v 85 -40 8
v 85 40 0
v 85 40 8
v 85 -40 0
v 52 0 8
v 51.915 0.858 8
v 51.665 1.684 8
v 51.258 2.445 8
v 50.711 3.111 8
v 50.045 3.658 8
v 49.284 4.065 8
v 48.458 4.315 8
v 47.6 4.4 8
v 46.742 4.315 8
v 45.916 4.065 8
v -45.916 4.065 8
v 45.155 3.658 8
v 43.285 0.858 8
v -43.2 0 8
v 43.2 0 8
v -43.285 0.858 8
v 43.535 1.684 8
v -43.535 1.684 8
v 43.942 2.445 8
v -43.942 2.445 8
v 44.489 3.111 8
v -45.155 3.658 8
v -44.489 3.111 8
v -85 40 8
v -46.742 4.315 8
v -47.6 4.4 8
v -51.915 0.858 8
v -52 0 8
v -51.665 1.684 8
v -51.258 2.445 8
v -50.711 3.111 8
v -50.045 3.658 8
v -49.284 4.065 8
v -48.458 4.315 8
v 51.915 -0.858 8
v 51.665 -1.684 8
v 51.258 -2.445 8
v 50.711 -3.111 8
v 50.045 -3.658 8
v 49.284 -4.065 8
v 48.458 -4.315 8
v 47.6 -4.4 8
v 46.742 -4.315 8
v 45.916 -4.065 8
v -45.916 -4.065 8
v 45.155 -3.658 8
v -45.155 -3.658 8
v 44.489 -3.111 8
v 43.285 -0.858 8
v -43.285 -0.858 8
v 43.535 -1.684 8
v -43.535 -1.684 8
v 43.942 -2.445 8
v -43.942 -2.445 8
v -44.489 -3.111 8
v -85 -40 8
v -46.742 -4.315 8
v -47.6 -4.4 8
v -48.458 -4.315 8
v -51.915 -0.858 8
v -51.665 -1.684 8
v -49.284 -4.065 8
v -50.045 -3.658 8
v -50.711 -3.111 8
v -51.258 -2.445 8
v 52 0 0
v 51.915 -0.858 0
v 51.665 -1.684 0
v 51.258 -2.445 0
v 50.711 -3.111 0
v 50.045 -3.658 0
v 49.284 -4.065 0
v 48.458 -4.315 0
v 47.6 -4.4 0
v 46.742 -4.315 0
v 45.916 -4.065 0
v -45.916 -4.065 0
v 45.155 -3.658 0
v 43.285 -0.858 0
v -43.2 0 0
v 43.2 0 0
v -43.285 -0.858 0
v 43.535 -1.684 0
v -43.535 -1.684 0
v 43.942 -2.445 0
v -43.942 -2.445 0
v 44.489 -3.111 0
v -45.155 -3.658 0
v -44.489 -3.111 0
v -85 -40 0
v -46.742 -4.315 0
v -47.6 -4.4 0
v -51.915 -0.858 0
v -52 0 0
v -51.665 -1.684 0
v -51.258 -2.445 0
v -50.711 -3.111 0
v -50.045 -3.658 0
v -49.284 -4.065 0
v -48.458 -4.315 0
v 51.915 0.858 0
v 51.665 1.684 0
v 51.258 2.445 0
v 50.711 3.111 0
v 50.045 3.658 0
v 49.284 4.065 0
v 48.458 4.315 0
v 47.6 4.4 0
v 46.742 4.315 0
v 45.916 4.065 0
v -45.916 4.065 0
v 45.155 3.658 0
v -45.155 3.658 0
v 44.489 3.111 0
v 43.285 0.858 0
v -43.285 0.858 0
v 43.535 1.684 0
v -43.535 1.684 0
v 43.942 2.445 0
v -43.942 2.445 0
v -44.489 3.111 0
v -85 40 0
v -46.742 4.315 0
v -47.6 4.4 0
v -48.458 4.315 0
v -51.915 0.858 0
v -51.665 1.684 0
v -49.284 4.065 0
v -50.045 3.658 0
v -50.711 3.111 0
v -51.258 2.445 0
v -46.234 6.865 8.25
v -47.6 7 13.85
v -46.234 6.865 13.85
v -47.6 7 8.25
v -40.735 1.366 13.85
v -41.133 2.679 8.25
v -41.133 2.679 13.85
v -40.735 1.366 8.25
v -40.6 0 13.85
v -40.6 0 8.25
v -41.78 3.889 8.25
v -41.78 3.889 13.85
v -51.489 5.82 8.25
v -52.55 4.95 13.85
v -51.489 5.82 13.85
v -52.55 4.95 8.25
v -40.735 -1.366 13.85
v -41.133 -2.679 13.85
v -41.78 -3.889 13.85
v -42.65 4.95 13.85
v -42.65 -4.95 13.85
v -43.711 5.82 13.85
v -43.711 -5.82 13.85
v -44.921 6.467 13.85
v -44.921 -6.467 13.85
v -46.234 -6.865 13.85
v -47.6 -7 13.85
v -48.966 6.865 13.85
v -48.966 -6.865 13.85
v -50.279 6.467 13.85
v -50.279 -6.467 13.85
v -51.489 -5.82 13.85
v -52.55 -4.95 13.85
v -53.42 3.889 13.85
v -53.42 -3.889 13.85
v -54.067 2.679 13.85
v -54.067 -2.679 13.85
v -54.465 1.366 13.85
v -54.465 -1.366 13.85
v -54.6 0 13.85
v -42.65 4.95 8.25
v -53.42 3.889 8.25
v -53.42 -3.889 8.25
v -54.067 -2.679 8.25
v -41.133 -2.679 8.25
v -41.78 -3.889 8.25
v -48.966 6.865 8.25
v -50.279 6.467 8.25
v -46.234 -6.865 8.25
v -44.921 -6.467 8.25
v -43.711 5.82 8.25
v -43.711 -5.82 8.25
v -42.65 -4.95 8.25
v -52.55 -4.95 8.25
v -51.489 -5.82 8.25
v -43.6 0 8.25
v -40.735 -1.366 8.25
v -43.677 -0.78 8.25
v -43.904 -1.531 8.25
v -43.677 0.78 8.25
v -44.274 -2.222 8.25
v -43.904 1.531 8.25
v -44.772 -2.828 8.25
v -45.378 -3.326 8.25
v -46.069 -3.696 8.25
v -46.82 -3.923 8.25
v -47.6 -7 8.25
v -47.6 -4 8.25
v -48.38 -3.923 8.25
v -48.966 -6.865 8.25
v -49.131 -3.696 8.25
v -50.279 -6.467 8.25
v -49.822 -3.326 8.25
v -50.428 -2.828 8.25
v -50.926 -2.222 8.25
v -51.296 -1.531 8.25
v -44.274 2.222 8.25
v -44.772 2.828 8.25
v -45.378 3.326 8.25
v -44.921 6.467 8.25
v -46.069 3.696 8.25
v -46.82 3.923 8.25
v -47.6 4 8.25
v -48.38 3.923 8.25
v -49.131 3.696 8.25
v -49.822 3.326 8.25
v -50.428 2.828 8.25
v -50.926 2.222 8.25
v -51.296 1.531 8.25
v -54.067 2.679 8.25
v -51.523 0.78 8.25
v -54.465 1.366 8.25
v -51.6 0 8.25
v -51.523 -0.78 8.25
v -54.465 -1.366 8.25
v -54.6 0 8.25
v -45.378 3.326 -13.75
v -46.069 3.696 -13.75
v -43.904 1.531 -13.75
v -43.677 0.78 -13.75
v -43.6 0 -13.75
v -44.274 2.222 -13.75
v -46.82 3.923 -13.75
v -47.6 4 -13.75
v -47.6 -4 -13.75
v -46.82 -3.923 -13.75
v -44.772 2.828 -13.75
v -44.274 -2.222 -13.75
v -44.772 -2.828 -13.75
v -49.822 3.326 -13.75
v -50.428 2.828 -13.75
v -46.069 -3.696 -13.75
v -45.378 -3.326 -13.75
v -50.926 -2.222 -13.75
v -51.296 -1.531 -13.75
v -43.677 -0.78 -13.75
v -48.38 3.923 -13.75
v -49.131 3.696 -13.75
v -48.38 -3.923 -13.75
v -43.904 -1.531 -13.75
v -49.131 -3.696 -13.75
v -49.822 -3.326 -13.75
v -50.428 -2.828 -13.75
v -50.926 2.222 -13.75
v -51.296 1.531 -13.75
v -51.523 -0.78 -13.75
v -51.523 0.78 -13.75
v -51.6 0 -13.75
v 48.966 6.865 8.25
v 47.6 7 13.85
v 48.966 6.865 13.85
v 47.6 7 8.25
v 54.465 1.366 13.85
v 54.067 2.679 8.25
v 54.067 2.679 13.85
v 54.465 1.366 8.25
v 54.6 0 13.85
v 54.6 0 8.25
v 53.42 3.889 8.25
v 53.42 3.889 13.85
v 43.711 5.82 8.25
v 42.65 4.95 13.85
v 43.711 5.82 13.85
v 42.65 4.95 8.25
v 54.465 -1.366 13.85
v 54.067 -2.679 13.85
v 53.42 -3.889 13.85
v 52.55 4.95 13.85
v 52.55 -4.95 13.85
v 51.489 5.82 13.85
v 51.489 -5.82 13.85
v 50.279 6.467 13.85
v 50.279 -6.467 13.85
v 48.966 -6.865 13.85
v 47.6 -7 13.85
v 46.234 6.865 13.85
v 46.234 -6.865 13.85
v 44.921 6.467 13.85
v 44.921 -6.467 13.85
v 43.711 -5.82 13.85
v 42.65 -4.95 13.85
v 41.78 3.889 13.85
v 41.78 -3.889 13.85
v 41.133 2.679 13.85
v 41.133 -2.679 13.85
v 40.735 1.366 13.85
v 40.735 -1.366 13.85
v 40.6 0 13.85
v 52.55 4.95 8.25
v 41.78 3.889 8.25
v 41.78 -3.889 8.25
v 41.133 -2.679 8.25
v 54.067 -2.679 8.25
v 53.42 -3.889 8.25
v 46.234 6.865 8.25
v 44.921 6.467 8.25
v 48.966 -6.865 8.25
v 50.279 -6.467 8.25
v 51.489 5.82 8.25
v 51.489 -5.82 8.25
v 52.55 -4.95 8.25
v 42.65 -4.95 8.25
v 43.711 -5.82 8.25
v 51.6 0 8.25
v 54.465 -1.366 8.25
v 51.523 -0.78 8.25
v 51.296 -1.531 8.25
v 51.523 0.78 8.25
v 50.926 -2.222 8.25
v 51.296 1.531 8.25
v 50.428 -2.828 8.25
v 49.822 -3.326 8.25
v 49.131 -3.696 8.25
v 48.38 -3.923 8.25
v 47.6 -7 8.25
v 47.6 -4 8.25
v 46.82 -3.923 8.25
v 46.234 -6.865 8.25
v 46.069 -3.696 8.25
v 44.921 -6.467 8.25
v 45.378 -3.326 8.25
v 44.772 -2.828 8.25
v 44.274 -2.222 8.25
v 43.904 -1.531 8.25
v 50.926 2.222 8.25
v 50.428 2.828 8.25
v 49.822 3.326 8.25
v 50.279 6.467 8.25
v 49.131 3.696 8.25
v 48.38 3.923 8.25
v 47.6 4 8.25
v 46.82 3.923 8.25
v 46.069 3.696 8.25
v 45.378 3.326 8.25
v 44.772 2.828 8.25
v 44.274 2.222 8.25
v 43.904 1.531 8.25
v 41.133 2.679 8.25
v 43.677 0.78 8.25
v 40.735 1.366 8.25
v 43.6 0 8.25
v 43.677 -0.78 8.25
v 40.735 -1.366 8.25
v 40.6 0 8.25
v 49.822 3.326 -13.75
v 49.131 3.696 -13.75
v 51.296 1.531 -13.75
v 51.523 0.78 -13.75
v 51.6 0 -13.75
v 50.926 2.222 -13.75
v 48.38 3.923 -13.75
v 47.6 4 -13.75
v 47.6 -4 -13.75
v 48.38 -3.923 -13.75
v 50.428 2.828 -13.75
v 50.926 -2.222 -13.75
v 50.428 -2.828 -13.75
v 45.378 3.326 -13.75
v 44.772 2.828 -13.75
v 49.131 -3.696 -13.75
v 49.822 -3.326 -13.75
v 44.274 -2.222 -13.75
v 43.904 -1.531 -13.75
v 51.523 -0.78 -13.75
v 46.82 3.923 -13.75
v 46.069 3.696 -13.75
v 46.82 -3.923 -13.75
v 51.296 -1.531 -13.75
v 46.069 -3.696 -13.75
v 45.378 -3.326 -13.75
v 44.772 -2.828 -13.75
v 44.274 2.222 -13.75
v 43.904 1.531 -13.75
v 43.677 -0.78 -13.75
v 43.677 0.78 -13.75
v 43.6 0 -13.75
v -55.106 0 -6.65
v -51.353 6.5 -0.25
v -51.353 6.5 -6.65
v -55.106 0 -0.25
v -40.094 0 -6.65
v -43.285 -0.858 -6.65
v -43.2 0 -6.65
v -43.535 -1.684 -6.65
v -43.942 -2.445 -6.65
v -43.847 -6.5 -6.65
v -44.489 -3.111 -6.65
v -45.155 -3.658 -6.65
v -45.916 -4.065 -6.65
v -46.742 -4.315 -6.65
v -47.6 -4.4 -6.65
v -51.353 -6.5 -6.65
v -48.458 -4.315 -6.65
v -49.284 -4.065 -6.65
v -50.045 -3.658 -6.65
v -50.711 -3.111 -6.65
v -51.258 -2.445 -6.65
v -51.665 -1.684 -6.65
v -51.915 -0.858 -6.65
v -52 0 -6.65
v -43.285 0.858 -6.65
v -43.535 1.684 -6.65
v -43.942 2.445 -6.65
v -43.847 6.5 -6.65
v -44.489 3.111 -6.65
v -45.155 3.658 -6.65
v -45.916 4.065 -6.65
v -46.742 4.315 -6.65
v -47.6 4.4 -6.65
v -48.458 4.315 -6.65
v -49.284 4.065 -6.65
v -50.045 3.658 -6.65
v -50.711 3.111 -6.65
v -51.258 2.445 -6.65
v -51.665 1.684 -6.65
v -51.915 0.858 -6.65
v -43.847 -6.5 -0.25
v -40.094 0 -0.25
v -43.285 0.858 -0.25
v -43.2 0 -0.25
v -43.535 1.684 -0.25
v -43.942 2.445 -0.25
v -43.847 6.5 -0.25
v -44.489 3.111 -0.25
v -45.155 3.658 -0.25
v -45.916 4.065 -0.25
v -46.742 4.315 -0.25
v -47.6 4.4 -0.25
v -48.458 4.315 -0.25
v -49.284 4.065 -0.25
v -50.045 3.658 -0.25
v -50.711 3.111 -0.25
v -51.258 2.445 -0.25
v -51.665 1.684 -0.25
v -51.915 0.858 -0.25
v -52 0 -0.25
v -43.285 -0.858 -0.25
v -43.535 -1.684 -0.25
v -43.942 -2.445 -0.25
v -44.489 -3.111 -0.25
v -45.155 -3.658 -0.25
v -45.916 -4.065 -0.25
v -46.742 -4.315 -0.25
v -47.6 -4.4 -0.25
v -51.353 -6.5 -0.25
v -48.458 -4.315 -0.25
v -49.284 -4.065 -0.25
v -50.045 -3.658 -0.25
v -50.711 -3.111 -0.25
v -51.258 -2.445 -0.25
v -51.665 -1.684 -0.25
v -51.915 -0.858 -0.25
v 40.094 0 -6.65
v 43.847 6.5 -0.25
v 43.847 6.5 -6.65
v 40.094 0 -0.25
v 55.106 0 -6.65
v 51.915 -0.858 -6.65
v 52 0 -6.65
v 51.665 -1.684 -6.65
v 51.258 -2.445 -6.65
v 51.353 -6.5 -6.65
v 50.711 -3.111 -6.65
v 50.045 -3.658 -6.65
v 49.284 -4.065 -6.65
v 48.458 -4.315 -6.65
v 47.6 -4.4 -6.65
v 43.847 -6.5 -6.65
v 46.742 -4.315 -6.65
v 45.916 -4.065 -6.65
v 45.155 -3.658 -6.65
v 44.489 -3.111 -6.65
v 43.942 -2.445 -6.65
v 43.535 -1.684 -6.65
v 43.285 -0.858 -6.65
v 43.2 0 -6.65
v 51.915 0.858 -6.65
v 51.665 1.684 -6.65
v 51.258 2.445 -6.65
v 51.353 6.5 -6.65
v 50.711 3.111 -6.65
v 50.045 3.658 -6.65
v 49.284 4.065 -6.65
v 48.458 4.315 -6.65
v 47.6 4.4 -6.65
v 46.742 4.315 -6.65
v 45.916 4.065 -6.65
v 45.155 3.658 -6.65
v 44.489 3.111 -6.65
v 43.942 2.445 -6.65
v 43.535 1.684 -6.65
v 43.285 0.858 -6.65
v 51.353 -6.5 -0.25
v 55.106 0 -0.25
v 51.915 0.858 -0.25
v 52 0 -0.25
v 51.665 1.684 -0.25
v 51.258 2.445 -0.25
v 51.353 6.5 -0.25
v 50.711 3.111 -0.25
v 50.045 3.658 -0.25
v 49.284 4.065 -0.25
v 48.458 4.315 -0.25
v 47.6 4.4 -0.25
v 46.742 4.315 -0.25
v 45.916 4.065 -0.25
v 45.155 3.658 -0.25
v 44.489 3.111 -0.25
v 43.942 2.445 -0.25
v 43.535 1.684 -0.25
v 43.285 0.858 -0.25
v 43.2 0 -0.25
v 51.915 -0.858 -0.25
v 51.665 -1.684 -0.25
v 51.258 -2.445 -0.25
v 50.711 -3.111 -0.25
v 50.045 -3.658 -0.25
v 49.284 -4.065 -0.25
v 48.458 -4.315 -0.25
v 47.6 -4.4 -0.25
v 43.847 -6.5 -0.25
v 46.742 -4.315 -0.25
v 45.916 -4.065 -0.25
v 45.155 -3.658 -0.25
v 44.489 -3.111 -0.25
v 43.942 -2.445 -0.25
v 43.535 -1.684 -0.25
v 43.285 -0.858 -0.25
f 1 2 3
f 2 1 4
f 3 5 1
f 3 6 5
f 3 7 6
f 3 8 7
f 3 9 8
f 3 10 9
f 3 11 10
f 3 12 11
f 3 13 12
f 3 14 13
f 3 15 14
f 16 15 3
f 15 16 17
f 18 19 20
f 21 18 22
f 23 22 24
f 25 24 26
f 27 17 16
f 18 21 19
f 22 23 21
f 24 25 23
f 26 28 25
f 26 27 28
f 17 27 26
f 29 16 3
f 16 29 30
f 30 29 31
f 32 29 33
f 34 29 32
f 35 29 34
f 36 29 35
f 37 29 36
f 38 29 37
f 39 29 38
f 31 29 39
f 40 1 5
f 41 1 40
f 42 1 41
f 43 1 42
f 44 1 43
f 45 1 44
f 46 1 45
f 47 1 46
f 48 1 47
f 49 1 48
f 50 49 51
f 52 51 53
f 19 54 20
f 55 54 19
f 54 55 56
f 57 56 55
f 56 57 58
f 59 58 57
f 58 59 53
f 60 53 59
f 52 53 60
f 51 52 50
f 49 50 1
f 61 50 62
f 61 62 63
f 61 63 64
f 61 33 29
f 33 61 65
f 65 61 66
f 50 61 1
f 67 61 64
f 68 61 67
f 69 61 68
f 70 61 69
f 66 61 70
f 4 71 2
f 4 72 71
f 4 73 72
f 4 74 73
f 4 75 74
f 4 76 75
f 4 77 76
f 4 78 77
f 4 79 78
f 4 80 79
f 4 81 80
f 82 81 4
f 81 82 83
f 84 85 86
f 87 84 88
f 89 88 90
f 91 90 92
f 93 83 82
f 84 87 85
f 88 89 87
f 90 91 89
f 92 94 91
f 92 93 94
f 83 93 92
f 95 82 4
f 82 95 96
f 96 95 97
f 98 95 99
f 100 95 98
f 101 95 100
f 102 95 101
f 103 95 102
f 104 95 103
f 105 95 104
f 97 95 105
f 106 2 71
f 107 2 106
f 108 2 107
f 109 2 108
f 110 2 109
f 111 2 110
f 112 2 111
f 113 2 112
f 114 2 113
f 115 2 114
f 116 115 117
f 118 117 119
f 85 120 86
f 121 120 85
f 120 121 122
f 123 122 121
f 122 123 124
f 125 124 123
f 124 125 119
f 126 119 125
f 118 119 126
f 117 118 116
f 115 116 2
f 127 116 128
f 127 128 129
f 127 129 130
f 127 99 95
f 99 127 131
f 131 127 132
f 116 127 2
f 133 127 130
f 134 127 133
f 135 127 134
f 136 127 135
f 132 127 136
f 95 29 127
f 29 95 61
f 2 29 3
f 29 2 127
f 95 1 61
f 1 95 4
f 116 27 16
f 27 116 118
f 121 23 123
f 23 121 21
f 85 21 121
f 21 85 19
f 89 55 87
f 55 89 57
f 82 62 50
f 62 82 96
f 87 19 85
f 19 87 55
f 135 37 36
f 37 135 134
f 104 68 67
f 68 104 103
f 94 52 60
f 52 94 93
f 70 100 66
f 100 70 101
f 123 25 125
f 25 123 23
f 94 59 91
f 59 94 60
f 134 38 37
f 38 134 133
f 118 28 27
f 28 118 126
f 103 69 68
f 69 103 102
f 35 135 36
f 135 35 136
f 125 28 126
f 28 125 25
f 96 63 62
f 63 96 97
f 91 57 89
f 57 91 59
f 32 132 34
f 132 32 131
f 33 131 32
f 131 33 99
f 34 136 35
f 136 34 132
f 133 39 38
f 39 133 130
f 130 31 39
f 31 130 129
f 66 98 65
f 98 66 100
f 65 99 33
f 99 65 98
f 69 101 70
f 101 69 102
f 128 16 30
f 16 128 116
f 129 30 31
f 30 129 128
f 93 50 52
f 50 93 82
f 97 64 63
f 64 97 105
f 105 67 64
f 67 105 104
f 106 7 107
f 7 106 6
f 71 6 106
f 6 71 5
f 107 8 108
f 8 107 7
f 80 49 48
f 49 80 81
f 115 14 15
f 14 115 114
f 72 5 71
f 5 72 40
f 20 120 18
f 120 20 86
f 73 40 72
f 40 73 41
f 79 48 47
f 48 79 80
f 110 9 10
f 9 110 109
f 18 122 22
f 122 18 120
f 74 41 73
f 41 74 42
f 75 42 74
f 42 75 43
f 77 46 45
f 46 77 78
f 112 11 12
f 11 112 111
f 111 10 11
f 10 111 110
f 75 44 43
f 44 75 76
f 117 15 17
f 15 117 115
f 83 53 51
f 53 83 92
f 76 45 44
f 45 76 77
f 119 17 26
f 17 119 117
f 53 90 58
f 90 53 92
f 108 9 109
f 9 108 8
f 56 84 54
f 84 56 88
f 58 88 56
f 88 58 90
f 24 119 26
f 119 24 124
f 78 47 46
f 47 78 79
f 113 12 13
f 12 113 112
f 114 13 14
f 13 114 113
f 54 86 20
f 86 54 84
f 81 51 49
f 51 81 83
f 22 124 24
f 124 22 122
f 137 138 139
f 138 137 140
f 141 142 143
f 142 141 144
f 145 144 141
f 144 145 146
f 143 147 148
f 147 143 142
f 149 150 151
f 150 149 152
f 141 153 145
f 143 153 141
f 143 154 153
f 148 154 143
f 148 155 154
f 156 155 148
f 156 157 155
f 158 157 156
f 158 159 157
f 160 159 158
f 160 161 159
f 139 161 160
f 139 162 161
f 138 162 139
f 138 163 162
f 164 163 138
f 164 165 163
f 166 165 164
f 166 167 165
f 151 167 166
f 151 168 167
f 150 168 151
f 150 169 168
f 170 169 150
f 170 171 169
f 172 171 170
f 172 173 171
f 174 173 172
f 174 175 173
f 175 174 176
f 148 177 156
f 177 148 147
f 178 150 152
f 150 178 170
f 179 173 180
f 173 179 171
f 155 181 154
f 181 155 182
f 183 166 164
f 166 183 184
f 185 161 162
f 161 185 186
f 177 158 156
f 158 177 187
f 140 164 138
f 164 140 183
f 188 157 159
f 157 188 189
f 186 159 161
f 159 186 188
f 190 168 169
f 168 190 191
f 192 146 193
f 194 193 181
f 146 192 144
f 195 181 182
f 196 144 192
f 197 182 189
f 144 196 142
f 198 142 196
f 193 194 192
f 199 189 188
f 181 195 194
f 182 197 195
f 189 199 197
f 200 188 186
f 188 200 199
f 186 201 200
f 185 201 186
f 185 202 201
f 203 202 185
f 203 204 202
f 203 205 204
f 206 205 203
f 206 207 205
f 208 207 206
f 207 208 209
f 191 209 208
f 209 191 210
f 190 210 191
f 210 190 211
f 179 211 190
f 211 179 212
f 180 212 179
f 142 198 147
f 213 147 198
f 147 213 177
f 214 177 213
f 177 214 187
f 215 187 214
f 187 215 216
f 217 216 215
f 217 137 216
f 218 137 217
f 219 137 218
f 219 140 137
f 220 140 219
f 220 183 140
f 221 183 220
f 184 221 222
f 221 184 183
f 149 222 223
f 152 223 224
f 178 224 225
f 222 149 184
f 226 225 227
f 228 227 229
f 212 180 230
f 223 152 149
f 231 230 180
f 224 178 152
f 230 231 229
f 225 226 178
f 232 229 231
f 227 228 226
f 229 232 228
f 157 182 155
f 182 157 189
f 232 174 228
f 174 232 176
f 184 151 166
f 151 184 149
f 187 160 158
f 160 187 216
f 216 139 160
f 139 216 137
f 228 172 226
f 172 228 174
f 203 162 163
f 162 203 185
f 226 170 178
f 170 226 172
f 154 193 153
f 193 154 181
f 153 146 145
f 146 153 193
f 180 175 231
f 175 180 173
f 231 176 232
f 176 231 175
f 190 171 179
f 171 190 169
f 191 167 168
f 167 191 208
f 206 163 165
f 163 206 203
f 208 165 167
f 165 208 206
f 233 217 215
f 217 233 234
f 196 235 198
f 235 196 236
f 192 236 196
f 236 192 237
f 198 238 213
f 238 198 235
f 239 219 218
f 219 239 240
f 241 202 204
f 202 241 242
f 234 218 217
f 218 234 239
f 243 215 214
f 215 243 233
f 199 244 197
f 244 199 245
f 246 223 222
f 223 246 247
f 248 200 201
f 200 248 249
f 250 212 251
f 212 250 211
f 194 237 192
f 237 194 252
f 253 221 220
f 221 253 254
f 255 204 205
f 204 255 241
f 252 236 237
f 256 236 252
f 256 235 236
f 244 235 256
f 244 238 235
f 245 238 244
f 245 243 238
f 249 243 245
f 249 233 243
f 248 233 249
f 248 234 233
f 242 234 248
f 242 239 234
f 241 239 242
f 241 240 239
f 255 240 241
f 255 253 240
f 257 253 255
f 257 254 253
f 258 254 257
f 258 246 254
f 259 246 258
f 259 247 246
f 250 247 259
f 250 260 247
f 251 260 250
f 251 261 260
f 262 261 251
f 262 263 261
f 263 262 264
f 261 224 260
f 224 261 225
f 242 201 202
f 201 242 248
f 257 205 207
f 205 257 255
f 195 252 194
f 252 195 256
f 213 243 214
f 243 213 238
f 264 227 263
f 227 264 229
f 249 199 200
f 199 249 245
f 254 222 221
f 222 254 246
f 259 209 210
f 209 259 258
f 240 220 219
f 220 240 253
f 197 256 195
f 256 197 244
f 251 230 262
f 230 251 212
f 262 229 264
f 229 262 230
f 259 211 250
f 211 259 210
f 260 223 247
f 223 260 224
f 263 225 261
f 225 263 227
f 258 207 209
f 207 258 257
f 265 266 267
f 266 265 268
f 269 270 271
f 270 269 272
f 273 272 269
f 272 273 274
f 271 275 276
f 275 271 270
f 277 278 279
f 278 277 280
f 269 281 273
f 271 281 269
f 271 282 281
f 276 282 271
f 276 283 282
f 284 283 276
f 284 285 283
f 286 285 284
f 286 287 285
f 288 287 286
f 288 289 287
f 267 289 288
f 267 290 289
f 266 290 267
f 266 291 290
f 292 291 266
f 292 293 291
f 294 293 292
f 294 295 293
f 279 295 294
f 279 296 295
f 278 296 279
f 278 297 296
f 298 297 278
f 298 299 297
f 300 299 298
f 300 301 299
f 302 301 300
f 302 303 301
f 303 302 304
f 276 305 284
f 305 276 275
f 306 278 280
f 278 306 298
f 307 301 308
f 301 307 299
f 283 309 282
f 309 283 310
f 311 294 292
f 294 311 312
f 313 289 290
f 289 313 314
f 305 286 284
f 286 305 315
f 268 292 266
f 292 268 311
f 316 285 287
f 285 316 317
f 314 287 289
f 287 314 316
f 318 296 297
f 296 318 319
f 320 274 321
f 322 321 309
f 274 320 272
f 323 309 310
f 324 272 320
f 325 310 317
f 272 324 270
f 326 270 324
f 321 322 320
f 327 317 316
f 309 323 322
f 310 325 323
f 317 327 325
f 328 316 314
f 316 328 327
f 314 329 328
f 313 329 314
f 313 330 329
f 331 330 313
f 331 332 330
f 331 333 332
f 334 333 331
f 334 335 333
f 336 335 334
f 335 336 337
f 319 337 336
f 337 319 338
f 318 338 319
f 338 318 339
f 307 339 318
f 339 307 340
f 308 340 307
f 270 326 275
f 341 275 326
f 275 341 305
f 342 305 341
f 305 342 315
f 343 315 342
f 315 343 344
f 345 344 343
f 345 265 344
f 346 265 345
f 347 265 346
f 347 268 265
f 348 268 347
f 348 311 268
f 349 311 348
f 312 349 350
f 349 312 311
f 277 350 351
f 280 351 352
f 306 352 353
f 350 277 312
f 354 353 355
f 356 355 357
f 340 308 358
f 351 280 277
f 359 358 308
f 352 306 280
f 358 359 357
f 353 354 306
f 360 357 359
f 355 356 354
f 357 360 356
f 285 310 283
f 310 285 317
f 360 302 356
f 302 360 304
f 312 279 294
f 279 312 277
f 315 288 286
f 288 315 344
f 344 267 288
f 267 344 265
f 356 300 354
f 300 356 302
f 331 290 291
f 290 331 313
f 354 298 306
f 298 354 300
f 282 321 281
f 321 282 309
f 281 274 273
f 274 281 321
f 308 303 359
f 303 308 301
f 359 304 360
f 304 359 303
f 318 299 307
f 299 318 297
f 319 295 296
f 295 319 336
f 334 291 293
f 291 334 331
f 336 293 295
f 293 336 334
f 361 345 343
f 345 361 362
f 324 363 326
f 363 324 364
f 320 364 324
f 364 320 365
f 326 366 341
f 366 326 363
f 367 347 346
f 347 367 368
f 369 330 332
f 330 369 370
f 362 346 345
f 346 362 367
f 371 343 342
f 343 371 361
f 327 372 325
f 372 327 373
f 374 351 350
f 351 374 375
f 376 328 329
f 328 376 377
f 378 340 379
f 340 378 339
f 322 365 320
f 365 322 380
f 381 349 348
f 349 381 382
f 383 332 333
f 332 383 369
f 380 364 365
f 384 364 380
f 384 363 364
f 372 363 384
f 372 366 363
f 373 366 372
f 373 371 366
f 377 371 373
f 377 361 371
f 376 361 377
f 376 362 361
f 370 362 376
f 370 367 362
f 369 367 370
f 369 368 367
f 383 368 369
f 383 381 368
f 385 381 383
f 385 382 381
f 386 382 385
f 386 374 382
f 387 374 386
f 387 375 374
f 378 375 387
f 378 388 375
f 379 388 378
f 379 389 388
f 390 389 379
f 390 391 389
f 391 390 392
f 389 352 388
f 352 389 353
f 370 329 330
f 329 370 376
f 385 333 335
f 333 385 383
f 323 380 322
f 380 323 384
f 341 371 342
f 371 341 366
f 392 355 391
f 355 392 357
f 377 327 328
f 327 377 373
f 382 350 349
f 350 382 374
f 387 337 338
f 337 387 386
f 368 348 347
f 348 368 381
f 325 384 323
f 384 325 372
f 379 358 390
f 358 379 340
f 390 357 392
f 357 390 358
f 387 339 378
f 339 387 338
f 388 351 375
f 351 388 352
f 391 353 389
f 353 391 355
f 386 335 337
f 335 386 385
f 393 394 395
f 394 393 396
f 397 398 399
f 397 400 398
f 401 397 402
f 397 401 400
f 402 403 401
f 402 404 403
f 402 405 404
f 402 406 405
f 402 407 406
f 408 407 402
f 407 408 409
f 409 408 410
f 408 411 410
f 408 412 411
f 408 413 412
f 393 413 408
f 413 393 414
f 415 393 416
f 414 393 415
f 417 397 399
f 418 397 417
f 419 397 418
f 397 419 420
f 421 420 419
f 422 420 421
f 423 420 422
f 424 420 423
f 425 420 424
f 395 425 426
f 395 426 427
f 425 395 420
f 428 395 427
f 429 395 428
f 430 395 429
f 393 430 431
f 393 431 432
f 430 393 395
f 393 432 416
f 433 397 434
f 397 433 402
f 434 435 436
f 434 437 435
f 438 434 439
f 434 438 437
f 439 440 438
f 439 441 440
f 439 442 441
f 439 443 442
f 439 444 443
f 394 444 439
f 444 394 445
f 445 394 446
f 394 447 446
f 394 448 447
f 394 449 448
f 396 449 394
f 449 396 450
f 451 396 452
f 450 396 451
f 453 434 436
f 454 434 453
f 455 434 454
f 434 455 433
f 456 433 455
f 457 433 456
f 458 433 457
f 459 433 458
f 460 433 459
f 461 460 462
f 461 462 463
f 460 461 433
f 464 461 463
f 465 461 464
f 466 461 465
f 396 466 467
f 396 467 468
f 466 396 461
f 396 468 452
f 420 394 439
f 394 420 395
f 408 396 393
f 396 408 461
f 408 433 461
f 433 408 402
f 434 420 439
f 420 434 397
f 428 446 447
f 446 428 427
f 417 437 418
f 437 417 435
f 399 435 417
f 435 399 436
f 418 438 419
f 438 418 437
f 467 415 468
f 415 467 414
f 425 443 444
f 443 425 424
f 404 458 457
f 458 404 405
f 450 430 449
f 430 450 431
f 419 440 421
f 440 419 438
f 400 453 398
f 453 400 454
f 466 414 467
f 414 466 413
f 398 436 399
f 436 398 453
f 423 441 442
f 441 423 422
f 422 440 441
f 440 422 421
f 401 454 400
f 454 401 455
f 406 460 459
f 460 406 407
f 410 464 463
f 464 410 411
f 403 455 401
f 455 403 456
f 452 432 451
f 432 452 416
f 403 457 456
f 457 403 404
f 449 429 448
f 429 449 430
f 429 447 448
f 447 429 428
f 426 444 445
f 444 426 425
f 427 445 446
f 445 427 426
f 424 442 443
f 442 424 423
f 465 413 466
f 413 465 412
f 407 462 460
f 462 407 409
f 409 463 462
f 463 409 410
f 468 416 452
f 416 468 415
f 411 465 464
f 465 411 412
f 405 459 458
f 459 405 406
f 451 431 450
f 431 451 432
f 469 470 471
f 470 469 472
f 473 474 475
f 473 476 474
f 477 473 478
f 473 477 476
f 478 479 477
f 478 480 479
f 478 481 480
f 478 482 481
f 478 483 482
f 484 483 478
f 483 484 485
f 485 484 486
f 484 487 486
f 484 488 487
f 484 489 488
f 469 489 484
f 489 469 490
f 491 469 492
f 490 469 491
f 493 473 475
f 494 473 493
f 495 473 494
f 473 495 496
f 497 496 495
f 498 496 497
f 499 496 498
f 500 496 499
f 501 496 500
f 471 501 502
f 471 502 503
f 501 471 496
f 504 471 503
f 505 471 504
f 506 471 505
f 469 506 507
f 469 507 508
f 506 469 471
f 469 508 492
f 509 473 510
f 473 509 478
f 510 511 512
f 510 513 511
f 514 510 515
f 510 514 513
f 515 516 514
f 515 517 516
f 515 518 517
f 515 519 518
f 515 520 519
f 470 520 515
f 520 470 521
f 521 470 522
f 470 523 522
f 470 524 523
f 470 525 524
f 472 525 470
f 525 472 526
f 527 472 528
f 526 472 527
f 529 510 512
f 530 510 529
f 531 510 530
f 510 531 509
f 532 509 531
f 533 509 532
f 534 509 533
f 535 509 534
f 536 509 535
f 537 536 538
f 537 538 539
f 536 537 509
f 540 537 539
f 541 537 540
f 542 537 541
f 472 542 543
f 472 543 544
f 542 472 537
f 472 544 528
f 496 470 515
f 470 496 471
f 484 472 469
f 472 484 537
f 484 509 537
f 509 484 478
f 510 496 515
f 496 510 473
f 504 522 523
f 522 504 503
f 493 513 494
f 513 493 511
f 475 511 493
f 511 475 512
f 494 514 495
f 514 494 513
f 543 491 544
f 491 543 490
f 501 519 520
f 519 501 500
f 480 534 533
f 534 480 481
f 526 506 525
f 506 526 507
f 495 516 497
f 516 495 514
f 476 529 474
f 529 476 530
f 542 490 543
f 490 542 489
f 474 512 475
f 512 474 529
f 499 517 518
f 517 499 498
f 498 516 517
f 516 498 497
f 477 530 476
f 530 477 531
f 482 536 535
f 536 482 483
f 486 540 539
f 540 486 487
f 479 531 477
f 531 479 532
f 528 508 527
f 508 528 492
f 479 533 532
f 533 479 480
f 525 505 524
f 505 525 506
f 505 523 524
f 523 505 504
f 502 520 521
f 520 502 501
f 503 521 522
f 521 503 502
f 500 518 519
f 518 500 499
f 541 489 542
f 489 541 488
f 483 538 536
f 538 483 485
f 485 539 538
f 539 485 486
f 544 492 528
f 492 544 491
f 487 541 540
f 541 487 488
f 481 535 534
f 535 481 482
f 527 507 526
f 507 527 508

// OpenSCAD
$fn = 32;

// ------------------------------------------------------------------------
// Bolted plate: 170 x 80 x 8 mm plate, 2 fasteners
// Every part is its own module, assembly() places them once.
// ------------------------------------------------------------------------

// --- part 1 ---
module plate() {
  difference() {
    translate([-85, -40, 0]) cube([170, 80, 8]);
    translate([-47.6, 0, -1]) cylinder(h = 10, d = 8.8);
    translate([47.6, 0, -1]) cylinder(h = 10, d = 8.8);
  }
}

// --- part 2 ---
module bolt1() {
  cylinder(h = 5.6, d = 14);
  translate([0, 0, -22]) cylinder(h = 22, d = 8);
}

// --- part 3 ---
module bolt2() {
  cylinder(h = 5.6, d = 14);
  translate([0, 0, -22]) cylinder(h = 22, d = 8);
}

// --- part 4 ---
module nut1() {
  difference() {
    linear_extrude(height = 6.4) polygon(points = [[7.506, 0], [3.753, 6.5], [-3.753, 6.5], [-7.506, 0], [-3.753, -6.5], [3.753, -6.5]]);
    translate([0, 0, -1]) cylinder(h = 8.4, d = 8.8);
  }
}

// --- part 5 ---
module nut2() {
  difference() {
    linear_extrude(height = 6.4) polygon(points = [[7.506, 0], [3.753, 6.5], [-3.753, 6.5], [-7.506, 0], [-3.753, -6.5], [3.753, -6.5]]);
    translate([0, 0, -1]) cylinder(h = 8.4, d = 8.8);
  }
}

// --- assembly ---
module assembly() {
  translate([0, 0, 0]) rotate([0, 0, 0]) plate();
  translate([-47.6, 0, 8.25]) rotate([0, 0, 0]) bolt1();
  translate([47.6, 0, 8.25]) rotate([0, 0, 0]) bolt2();
  translate([-47.6, 0, -6.65]) rotate([0, 0, 0]) nut1();
  translate([47.6, 0, -6.65]) rotate([0, 0, 0]) nut2();
}

assembly();
